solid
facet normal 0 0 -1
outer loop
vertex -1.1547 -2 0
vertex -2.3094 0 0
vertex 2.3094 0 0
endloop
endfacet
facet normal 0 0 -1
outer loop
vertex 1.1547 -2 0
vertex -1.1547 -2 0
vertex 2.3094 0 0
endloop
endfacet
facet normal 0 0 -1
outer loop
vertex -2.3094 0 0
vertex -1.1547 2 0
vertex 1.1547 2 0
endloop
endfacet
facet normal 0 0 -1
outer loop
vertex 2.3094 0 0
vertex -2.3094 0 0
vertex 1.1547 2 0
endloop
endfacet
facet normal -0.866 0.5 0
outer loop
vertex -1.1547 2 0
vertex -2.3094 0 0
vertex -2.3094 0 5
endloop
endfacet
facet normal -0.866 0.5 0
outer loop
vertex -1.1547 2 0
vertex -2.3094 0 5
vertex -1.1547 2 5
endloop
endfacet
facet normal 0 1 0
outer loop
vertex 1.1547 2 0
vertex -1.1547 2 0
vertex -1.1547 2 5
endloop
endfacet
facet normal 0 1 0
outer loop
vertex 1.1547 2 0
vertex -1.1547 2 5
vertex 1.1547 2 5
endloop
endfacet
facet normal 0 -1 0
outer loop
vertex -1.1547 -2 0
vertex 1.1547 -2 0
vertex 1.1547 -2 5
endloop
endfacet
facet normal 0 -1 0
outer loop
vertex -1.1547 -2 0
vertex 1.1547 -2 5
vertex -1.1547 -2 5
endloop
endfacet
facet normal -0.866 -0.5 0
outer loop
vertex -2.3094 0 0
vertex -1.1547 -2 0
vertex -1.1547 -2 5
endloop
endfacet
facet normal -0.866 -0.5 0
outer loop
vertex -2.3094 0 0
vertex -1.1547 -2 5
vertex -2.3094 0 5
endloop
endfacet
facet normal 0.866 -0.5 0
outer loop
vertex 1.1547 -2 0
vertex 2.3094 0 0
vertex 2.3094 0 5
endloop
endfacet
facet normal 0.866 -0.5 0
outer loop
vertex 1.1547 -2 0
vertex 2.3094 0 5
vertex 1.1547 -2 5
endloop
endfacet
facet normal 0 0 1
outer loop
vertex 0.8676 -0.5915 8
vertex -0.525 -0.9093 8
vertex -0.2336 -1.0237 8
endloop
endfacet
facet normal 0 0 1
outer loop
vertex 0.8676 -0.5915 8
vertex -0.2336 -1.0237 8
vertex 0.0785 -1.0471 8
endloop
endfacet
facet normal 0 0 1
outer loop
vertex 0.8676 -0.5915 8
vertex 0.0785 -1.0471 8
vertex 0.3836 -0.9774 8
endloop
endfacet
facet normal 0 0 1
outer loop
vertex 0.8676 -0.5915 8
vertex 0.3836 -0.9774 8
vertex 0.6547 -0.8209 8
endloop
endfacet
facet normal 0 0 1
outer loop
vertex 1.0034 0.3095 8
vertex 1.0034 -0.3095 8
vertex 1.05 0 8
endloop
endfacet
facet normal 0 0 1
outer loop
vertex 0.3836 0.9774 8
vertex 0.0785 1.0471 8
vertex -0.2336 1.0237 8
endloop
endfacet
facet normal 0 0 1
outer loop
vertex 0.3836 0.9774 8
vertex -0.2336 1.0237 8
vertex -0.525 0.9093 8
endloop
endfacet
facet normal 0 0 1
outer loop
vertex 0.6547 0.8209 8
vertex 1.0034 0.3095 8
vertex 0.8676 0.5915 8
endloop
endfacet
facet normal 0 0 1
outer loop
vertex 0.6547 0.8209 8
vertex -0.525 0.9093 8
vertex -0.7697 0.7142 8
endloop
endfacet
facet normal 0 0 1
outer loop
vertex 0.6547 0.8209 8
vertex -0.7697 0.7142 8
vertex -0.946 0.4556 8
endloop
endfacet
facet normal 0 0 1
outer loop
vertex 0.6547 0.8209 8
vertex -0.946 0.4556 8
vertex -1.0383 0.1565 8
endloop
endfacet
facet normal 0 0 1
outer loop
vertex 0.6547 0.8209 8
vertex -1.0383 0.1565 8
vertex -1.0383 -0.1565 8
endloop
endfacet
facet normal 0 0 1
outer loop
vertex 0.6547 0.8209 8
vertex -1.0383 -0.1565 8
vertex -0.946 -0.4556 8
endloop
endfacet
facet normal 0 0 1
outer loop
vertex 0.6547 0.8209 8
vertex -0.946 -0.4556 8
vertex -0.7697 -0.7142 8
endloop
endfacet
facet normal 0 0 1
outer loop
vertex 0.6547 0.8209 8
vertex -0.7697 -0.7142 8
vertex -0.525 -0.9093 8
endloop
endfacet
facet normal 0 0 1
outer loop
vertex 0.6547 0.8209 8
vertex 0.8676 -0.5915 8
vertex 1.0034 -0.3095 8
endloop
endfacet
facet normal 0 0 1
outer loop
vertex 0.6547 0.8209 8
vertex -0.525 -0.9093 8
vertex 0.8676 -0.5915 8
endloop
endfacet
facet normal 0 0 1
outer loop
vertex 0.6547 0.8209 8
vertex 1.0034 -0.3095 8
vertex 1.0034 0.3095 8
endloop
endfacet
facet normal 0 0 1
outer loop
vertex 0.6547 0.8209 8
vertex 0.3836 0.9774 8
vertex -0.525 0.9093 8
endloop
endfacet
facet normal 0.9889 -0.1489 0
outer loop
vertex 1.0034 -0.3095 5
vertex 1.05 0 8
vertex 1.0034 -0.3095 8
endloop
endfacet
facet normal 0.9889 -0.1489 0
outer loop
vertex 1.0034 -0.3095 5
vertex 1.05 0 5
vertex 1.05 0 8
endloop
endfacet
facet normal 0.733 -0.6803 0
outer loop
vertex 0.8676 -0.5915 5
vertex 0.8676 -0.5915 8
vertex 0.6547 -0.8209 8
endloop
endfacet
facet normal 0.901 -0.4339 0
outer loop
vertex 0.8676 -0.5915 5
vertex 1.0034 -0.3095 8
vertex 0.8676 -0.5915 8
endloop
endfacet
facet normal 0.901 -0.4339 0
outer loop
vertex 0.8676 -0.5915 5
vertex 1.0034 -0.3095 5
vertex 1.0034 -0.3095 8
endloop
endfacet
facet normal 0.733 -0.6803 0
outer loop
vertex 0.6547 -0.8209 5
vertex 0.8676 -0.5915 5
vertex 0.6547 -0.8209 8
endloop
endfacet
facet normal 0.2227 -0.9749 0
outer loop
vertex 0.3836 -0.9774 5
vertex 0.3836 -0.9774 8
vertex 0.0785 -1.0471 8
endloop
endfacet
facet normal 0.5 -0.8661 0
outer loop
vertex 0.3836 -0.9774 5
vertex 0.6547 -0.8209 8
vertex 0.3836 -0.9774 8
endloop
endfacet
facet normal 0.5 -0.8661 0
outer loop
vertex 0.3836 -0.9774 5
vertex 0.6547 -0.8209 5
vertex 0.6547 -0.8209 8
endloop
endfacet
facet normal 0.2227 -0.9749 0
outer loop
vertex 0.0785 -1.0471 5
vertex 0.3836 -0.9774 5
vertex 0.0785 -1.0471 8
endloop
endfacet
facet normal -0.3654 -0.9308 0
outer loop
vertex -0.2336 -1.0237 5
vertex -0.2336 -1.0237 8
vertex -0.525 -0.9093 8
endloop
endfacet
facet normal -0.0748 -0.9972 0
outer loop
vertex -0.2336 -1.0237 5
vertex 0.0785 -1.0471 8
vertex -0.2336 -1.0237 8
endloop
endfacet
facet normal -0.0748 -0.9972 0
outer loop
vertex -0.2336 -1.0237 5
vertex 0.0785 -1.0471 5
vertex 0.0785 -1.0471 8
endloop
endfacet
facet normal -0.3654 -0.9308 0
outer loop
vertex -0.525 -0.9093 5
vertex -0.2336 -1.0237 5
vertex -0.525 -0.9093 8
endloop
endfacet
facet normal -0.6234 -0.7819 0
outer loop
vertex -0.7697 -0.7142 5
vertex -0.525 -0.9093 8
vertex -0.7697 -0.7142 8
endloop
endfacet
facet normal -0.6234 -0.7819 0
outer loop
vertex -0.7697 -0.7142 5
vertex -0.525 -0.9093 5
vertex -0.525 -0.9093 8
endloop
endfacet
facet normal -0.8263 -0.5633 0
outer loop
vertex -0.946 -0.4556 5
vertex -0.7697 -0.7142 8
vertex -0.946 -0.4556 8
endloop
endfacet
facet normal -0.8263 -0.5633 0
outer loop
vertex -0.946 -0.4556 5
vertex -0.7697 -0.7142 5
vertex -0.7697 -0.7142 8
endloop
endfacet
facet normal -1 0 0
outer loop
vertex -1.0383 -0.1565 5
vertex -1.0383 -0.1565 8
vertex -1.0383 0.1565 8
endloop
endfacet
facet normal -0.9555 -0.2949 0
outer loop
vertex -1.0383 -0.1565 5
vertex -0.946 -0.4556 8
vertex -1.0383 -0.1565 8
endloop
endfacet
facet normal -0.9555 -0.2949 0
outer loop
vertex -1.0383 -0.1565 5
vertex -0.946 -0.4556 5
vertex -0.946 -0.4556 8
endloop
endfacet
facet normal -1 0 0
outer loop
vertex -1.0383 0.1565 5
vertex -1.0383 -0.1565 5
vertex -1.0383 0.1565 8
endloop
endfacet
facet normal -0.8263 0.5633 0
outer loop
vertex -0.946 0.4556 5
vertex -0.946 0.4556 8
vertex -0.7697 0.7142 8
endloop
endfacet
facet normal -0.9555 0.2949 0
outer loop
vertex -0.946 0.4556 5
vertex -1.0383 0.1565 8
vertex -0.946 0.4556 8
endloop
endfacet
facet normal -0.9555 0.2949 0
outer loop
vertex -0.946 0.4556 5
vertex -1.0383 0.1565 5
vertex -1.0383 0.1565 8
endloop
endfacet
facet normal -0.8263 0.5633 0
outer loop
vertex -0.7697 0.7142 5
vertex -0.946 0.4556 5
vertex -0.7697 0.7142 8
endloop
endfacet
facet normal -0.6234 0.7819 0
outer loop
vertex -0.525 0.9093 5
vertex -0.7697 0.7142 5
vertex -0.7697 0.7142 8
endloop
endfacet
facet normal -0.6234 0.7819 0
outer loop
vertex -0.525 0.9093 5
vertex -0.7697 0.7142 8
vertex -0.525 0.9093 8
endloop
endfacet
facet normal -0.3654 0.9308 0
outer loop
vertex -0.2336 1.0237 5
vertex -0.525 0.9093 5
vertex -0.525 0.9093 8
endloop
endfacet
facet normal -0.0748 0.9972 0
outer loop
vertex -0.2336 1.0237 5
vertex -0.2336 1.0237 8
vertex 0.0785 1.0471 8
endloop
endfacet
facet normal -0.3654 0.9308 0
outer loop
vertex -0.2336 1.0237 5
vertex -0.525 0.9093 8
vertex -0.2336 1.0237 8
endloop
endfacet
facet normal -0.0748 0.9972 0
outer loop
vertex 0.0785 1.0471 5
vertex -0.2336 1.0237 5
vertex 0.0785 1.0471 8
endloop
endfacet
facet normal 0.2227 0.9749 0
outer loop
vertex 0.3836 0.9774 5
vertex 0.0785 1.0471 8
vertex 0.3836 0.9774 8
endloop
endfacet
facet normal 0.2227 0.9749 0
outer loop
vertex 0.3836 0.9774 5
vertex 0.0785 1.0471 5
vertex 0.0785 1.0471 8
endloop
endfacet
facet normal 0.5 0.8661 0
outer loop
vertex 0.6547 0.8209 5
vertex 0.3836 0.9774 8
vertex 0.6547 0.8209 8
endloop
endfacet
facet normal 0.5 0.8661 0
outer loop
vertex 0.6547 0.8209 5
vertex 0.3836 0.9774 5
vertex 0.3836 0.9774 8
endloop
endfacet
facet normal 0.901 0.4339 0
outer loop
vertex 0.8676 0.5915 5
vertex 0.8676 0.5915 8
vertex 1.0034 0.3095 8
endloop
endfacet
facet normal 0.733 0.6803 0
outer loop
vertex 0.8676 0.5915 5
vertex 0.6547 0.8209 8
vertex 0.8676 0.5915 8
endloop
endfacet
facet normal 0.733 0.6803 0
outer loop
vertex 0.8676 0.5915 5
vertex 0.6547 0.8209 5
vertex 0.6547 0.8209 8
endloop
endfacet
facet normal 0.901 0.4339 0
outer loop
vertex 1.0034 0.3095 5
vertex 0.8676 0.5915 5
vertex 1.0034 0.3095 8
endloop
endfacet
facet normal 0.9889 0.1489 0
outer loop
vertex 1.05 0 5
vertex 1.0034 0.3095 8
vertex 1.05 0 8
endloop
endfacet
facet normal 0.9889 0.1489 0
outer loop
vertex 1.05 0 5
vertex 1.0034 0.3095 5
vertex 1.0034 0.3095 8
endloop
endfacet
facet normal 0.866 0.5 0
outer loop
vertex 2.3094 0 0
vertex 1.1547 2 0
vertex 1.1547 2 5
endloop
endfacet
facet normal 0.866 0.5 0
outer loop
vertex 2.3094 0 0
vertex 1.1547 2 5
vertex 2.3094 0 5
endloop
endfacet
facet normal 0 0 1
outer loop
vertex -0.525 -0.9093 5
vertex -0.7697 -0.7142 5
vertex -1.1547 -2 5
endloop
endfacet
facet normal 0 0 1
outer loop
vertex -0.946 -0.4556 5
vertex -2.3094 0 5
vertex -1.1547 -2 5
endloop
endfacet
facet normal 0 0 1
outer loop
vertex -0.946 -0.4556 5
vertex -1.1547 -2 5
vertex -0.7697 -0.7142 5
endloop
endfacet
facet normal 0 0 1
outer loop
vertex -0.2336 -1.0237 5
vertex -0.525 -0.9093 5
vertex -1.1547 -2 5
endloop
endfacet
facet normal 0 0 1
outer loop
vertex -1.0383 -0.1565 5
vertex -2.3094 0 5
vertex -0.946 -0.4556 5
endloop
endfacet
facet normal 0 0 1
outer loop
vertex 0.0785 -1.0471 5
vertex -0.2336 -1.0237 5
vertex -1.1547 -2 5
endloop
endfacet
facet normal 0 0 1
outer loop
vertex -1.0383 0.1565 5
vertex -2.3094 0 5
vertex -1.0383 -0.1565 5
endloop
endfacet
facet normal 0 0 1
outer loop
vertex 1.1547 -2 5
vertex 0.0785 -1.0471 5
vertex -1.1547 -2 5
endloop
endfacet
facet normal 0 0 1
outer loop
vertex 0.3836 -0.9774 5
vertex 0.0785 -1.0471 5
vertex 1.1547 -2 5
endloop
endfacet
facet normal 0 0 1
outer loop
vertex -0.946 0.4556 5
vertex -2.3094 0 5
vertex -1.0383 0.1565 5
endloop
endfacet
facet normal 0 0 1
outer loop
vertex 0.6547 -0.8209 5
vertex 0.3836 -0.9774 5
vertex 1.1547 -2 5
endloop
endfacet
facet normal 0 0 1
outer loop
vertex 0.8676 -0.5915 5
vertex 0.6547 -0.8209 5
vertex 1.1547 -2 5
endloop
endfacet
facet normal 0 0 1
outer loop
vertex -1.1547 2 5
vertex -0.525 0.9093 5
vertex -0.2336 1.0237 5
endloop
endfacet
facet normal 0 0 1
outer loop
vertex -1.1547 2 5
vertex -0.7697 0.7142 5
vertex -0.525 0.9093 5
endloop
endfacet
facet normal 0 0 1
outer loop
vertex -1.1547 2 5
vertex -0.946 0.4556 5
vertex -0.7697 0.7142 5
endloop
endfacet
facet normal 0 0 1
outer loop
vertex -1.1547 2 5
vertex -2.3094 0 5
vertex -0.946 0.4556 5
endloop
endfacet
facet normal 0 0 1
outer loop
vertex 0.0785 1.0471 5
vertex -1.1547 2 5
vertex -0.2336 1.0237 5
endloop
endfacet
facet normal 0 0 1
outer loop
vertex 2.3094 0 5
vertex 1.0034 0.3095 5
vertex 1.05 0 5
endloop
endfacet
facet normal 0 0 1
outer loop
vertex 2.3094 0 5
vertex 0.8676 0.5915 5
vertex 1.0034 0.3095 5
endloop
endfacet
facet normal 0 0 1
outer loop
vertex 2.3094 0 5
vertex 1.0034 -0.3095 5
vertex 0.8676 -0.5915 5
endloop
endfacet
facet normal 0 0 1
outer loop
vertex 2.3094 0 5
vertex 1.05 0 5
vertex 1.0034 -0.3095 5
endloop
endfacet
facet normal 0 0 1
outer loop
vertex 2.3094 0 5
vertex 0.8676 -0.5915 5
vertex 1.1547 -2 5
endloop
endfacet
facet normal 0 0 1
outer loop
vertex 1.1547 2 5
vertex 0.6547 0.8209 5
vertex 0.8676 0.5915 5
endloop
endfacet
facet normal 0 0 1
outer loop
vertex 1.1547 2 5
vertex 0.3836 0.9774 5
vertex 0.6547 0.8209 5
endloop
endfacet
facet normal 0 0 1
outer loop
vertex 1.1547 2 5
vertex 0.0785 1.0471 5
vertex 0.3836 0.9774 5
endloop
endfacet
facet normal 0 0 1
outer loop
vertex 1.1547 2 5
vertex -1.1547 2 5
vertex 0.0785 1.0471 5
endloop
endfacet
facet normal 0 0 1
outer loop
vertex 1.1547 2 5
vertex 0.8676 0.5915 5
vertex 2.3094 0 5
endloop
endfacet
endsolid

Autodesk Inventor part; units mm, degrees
ref_plane "YZ Plane" through (0, 0, 0) normal (1, 0, 0) x (0, 1, 0)
ref_plane "XZ Plane" through (0, 0, 0) normal (0, 1, 0) x (-1, 0, 0)
ref_plane "XY Plane" through (0, 0, 0) normal (0, 0, 1) x (1, 0, 0)
sketch "草图1" plane through (0, 0, 0) normal (0, 0, 1) x (1, 0, 0)
  circle A0 centre (0, 0) radius 1.05
  line L0 (1.1547, -2) -> (-1.1547, -2)
  line L1 (-1.1547, -2) -> (-2.3094, 0)
  line L2 (-2.3094, 0) -> (-1.1547, 2)
  line L3 (-1.1547, 2) -> (1.1547, 2)
  line L4 (1.1547, 2) -> (2.3094, 0)
  line L5 (2.3094, 0) -> (1.1547, -2)
  dimension "d0" = 2.1
  dimension "d2" = 4
extrude "拉伸1" add sketch "草图1" along normal blind 8 contours A0
extrude "拉伸2" add sketch "草图1" along normal blind 5
properties part number "铜柱"
